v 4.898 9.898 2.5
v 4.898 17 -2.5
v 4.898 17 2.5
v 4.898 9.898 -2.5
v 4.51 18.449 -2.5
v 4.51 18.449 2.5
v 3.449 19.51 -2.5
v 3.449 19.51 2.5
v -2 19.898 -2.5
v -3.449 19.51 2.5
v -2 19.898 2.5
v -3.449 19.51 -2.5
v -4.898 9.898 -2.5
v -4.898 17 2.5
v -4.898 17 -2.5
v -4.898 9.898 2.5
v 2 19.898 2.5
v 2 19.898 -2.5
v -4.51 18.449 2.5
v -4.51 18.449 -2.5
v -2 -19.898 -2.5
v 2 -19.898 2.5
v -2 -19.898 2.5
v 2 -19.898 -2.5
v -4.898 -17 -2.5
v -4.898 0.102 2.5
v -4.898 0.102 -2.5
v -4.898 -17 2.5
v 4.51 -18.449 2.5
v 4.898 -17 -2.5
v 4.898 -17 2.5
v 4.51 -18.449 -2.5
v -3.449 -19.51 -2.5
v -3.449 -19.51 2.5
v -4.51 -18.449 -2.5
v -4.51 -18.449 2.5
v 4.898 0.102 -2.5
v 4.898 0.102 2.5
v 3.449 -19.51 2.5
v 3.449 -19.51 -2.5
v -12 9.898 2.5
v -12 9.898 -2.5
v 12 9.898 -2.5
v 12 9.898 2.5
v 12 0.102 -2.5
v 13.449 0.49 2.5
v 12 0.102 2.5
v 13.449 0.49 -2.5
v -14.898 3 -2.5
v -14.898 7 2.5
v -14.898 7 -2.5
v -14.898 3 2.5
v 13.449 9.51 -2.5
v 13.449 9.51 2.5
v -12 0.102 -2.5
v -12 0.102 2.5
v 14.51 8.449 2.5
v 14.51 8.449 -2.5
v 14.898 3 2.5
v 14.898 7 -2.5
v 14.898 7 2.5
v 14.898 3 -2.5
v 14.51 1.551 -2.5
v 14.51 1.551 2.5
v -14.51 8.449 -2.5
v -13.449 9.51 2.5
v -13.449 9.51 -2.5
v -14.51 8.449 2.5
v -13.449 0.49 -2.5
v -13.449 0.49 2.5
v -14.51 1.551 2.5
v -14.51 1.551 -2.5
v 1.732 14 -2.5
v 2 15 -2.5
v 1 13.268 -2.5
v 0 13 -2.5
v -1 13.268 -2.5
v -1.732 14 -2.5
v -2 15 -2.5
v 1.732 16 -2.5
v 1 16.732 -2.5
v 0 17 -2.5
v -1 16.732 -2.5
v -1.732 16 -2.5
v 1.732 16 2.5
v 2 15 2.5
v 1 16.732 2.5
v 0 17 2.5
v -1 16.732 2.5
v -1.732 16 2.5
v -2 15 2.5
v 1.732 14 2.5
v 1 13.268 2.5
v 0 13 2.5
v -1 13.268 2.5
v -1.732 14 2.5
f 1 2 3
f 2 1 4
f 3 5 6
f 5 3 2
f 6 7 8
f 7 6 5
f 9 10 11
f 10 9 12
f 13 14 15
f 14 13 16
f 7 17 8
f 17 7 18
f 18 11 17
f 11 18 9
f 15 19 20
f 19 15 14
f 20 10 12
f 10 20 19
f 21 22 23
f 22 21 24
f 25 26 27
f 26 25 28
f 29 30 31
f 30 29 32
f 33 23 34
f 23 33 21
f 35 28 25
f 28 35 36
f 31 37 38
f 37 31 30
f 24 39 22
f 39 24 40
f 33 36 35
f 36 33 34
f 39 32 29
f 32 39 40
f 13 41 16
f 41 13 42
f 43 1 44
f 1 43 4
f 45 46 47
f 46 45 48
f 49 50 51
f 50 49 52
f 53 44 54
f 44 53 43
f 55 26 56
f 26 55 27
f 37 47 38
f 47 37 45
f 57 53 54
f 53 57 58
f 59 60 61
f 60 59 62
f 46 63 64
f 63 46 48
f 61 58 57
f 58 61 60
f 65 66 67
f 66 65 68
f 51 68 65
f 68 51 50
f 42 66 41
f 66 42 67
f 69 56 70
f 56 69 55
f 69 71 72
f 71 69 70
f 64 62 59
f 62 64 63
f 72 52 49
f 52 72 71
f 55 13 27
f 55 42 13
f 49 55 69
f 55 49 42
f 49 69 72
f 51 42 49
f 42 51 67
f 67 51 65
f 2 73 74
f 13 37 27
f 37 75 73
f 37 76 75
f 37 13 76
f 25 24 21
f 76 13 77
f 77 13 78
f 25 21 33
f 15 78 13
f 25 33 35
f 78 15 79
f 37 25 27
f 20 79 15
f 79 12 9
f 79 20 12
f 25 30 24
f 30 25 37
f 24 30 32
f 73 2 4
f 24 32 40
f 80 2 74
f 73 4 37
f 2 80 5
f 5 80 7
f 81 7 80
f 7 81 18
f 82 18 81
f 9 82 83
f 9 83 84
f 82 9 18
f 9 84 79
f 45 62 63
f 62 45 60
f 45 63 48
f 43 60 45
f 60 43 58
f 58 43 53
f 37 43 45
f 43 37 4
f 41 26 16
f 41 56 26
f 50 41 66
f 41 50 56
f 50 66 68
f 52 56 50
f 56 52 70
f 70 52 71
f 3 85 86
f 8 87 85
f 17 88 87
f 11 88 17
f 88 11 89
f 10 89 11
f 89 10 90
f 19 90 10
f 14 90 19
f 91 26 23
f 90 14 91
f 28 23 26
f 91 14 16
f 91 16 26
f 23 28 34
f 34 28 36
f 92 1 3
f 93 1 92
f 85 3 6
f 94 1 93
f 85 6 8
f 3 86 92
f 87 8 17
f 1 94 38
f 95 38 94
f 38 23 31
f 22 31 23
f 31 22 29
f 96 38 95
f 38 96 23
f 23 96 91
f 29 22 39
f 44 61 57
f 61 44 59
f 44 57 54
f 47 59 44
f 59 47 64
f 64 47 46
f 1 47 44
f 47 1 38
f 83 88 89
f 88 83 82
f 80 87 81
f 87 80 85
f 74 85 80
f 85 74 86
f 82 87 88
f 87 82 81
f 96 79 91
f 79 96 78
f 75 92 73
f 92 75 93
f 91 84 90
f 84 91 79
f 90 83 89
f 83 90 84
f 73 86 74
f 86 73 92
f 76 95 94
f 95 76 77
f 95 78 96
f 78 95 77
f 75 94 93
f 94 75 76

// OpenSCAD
// Pectoral Cross

// Copyright (C) 2015 Embecosm Limited (www.embecosm.com)

// Contributor: Jeremy Bennett <jeremy.bennett@embecosm.com>

// This file is licensed under the Creative Commons Attribution-ShareAlike 3.0
// Unported License. To view a copy of this license, visit
// http://creativecommons.org/licenses/by-sa/3.0/ or send a letter to Creative
// Commons, PO Box 1866, Mountain View, CA 94042, USA.


// A pectoral cross.  Scale according to your needs when printing.  Rounding
// the corners makes printing on a Rep Rap more forgiving.


// Thickness of cross
T = 5;

// Radius of Minkowski sphere
R = 3;

// Size of hole for ribbon
HOLE_R = 2.0;

// Thickness of first slice
SLICE = 0.4;

// The basic cross

module cross () {
   d = R * 2;
   difference () {
      minkowski () {
         union () {
            // The vertical
            cube (size = [10 - d, 40 - d, T], center = true);
            // The horizontal
            translate (v = [0, 5, 0])
               cube (size = [30 - d, 10 - d, T], center = true);
         }
         sphere (r = R, $fn = 12);
      }
      // Make a flat bottom
      translate (v = [0, 0, -250 - T/2])
         cube (size = [500, 500, 500], center = true);
      // Make a flat top
      translate (v = [0, 0, 250 + T/2])
         cube (size = [500, 500, 500], center = true);
   }
}


// Add a hole for the pectoral cross.  But leave the bottom layer for ease of
// printing - we'll drill it out later.

module pectoral_cross () {
   difference () {
      cross ();
      translate (v = [0, 15, 0])
         cylinder (h = 500, r = HOLE_R, $fn = 12, center = true);
   }
}


pectoral_cross ();
